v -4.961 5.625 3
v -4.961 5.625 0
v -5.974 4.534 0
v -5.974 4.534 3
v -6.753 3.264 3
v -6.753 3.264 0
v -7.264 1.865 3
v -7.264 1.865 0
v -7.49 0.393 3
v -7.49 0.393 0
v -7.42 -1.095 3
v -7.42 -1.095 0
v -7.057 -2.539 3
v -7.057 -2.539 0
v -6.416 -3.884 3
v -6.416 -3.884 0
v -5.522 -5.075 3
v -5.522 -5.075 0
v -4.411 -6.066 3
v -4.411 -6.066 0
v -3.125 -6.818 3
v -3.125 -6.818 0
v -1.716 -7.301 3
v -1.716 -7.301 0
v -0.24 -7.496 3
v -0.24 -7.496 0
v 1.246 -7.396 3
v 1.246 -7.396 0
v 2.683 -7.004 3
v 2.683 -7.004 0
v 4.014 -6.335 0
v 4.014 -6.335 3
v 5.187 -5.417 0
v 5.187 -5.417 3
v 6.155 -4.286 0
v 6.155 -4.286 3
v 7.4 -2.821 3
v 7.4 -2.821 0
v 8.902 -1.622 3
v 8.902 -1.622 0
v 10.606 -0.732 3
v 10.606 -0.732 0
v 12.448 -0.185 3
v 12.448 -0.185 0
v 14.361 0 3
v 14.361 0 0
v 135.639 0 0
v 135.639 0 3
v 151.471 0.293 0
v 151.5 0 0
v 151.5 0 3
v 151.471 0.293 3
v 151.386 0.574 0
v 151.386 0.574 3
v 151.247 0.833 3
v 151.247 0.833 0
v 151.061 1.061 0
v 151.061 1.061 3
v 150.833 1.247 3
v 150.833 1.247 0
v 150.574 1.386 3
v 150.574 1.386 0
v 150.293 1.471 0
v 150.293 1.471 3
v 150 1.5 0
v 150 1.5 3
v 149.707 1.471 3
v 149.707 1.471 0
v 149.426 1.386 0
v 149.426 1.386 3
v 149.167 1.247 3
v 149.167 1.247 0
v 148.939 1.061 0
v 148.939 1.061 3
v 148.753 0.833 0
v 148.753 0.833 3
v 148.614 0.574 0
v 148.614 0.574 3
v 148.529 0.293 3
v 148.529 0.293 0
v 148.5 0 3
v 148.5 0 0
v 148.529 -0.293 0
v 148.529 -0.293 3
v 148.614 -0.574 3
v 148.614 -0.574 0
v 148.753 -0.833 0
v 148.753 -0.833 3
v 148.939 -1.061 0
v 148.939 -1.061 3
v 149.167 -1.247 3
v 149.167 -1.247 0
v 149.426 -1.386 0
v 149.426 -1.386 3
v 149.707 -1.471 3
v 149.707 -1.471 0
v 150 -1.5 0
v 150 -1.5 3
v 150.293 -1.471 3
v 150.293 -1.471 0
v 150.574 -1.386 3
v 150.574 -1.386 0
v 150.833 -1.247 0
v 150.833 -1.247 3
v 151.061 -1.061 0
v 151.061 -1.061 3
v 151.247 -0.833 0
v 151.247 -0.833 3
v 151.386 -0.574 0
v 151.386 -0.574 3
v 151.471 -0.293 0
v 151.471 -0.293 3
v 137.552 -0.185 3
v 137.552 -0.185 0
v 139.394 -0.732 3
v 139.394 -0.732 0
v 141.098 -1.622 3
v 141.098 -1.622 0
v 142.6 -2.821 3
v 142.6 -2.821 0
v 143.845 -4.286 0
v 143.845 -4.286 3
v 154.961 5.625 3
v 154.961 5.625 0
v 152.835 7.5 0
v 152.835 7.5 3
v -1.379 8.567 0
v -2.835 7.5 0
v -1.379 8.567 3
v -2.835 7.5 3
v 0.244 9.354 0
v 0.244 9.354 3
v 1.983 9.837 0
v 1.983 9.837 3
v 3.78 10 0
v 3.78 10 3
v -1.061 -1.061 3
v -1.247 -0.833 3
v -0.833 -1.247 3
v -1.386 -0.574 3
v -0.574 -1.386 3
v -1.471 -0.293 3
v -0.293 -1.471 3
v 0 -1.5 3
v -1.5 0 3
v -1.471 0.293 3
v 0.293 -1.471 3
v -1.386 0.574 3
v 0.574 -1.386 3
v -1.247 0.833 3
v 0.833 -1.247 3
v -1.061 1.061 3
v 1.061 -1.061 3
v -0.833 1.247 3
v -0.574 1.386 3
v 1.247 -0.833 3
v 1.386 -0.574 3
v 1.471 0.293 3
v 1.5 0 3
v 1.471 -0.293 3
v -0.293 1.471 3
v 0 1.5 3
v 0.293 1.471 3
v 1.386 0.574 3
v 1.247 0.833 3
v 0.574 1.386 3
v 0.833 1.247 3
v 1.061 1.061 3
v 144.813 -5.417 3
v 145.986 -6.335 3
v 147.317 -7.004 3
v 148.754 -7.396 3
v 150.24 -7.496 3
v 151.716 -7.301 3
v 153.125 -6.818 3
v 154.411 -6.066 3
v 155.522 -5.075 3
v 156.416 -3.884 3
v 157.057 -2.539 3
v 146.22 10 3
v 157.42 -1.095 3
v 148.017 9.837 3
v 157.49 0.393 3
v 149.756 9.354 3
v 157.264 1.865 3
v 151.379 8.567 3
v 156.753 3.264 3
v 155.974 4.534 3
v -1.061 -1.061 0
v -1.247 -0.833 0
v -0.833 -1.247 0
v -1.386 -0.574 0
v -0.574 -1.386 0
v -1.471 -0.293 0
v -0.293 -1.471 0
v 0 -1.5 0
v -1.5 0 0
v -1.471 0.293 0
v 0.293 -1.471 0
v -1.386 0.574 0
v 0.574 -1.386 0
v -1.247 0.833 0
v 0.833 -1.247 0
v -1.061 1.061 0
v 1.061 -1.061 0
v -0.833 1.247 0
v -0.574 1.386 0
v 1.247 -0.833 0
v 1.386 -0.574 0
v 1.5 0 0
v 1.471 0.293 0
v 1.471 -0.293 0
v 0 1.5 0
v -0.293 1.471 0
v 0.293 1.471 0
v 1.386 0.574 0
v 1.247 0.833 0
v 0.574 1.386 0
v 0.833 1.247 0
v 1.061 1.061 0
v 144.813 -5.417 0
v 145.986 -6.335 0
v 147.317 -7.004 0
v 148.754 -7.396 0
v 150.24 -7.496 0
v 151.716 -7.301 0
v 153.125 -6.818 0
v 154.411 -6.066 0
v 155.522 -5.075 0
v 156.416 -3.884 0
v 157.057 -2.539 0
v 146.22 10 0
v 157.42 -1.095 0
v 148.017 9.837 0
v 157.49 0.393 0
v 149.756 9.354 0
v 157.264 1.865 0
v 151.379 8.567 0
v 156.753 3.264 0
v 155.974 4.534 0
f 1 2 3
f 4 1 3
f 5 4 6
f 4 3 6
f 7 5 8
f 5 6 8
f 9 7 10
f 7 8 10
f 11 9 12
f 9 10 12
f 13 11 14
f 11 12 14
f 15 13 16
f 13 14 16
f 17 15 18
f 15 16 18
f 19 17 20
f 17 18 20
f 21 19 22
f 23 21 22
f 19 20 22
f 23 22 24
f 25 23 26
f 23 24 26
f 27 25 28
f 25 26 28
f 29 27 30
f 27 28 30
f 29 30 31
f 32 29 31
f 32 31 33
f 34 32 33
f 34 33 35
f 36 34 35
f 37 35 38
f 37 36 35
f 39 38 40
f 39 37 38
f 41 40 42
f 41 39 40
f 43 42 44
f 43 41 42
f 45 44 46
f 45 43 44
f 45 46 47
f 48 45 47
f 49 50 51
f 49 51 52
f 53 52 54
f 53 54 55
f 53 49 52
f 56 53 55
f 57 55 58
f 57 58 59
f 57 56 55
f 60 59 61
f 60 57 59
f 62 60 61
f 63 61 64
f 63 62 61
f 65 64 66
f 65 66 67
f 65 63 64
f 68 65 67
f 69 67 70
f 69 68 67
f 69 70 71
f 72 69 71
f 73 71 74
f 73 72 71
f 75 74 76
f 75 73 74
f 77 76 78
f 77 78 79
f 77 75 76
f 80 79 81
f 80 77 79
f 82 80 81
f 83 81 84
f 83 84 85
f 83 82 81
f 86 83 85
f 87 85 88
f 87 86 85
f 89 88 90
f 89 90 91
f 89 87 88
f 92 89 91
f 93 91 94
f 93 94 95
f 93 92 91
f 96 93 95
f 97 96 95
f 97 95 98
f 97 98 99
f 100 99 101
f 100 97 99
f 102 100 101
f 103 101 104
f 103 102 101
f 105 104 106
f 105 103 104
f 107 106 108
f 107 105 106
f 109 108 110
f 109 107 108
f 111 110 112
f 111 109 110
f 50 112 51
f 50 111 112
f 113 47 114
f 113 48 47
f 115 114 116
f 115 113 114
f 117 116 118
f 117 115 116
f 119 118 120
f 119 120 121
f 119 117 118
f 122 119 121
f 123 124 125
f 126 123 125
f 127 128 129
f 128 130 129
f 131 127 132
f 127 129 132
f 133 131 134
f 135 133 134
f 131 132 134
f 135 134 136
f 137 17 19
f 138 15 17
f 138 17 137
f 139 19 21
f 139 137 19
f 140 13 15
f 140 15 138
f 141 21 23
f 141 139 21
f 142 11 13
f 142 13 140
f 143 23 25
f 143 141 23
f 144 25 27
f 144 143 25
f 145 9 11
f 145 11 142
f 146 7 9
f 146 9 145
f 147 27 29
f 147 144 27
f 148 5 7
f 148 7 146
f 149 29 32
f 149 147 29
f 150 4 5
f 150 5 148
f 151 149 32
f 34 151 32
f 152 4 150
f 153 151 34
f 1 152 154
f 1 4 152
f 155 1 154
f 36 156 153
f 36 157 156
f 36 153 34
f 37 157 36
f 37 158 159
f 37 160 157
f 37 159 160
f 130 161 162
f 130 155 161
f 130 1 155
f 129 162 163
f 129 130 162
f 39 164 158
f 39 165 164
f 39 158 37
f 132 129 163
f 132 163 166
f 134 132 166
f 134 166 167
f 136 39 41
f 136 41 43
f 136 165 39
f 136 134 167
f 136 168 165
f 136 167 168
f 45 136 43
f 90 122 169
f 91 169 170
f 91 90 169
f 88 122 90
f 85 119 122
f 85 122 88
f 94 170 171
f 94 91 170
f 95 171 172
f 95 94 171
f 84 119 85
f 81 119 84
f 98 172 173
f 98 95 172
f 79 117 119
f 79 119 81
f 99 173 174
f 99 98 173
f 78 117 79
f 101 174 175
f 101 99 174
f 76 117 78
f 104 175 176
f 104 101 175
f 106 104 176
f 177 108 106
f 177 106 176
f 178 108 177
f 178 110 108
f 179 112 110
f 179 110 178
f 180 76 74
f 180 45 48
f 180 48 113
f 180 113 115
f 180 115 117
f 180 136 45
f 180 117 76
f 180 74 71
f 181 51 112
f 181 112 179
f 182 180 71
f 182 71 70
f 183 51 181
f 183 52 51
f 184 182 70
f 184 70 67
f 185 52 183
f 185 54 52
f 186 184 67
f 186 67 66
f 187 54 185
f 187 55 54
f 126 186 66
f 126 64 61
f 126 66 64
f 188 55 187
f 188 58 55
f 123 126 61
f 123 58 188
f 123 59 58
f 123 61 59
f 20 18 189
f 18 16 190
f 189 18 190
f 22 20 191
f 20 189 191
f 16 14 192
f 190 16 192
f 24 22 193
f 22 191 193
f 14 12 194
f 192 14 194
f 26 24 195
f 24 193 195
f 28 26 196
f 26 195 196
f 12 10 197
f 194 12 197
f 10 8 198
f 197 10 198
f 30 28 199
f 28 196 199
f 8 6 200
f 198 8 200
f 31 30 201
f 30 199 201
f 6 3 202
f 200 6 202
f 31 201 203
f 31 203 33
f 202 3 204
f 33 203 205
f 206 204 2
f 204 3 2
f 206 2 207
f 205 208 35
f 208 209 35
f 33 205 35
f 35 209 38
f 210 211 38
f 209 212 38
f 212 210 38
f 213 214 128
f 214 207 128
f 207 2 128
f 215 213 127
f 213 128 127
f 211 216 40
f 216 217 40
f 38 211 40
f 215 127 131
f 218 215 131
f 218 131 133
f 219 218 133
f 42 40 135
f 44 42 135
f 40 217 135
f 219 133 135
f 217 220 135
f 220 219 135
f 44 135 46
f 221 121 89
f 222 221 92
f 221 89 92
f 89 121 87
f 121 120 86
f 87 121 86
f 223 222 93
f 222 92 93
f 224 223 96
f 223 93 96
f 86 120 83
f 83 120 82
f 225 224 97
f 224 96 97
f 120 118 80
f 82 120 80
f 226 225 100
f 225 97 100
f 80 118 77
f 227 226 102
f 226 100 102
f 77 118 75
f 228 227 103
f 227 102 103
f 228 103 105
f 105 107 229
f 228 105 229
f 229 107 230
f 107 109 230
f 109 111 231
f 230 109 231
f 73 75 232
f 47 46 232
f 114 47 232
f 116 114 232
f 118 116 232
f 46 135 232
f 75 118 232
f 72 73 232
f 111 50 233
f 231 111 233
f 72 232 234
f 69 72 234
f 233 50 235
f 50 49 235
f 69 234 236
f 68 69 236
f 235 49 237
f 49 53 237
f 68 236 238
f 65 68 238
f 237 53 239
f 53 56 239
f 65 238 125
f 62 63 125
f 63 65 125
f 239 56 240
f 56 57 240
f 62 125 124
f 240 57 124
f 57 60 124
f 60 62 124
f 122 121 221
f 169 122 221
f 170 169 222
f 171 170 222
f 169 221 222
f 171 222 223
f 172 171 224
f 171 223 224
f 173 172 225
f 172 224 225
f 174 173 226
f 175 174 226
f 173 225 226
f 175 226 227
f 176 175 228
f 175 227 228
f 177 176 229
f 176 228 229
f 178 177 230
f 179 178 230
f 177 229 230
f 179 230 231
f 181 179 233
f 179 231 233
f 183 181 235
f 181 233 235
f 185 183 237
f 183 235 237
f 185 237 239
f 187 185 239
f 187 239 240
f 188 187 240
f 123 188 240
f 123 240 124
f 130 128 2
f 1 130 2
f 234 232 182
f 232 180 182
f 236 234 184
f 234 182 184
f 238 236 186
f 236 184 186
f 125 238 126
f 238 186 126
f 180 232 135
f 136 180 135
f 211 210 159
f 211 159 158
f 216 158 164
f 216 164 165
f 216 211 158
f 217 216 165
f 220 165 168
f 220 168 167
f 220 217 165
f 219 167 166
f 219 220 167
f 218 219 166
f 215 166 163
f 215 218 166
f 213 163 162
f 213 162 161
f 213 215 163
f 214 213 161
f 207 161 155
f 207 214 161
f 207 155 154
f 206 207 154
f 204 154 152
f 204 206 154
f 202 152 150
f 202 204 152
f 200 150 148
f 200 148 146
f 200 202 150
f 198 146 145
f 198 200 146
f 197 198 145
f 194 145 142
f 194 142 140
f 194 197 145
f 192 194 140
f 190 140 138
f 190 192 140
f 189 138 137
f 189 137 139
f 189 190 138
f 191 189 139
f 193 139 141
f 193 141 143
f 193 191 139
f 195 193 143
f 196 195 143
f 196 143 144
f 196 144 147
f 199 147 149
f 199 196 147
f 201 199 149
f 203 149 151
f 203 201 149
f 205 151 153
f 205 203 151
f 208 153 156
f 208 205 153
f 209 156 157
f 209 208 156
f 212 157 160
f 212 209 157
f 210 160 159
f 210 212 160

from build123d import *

# Parameters (mm, degrees)
SKETCH1_R           = 1.5
BOSS_EXTRUDE1_DEPTH = 3
FILLET1_R           = 10


with BuildPart() as part:
    # Sketch1 → Boss-Extrude1 (new body)
    with BuildSketch(Plane.XY):
        with BuildLine():
            Line((0, 10), (-4.960783708, 5.625))
            ThreePointArc((-4.960783708, 5.625), (-3.085783708, -6.835783708), (7.5, 0))
            Line((7.5, 0), (142.5, 0))
            ThreePointArc((142.5, 0), (153.085783708, -6.835783708), (154.960783708, 5.625))
            Line((154.960783708, 5.625), (150, 10))
            Line((150, 10), (0, 10))
        make_face()
        Circle(SKETCH1_R, mode=Mode.SUBTRACT)
        with Locations((150, 0)):
            Circle(SKETCH1_R, mode=Mode.SUBTRACT)
    extrude(amount=BOSS_EXTRUDE1_DEPTH)

    # Fillet1
    fillet1_edges = [part.edges().sort_by_distance(p)[0] for p in [
        (7.5, 0, 1.5),
        (0, 10, 1.5),
        (150, 10, 1.5),
        (142.5, 0, 1.5),
    ]]
    fillet(fillet1_edges, radius=FILLET1_R)


solid = part.part
